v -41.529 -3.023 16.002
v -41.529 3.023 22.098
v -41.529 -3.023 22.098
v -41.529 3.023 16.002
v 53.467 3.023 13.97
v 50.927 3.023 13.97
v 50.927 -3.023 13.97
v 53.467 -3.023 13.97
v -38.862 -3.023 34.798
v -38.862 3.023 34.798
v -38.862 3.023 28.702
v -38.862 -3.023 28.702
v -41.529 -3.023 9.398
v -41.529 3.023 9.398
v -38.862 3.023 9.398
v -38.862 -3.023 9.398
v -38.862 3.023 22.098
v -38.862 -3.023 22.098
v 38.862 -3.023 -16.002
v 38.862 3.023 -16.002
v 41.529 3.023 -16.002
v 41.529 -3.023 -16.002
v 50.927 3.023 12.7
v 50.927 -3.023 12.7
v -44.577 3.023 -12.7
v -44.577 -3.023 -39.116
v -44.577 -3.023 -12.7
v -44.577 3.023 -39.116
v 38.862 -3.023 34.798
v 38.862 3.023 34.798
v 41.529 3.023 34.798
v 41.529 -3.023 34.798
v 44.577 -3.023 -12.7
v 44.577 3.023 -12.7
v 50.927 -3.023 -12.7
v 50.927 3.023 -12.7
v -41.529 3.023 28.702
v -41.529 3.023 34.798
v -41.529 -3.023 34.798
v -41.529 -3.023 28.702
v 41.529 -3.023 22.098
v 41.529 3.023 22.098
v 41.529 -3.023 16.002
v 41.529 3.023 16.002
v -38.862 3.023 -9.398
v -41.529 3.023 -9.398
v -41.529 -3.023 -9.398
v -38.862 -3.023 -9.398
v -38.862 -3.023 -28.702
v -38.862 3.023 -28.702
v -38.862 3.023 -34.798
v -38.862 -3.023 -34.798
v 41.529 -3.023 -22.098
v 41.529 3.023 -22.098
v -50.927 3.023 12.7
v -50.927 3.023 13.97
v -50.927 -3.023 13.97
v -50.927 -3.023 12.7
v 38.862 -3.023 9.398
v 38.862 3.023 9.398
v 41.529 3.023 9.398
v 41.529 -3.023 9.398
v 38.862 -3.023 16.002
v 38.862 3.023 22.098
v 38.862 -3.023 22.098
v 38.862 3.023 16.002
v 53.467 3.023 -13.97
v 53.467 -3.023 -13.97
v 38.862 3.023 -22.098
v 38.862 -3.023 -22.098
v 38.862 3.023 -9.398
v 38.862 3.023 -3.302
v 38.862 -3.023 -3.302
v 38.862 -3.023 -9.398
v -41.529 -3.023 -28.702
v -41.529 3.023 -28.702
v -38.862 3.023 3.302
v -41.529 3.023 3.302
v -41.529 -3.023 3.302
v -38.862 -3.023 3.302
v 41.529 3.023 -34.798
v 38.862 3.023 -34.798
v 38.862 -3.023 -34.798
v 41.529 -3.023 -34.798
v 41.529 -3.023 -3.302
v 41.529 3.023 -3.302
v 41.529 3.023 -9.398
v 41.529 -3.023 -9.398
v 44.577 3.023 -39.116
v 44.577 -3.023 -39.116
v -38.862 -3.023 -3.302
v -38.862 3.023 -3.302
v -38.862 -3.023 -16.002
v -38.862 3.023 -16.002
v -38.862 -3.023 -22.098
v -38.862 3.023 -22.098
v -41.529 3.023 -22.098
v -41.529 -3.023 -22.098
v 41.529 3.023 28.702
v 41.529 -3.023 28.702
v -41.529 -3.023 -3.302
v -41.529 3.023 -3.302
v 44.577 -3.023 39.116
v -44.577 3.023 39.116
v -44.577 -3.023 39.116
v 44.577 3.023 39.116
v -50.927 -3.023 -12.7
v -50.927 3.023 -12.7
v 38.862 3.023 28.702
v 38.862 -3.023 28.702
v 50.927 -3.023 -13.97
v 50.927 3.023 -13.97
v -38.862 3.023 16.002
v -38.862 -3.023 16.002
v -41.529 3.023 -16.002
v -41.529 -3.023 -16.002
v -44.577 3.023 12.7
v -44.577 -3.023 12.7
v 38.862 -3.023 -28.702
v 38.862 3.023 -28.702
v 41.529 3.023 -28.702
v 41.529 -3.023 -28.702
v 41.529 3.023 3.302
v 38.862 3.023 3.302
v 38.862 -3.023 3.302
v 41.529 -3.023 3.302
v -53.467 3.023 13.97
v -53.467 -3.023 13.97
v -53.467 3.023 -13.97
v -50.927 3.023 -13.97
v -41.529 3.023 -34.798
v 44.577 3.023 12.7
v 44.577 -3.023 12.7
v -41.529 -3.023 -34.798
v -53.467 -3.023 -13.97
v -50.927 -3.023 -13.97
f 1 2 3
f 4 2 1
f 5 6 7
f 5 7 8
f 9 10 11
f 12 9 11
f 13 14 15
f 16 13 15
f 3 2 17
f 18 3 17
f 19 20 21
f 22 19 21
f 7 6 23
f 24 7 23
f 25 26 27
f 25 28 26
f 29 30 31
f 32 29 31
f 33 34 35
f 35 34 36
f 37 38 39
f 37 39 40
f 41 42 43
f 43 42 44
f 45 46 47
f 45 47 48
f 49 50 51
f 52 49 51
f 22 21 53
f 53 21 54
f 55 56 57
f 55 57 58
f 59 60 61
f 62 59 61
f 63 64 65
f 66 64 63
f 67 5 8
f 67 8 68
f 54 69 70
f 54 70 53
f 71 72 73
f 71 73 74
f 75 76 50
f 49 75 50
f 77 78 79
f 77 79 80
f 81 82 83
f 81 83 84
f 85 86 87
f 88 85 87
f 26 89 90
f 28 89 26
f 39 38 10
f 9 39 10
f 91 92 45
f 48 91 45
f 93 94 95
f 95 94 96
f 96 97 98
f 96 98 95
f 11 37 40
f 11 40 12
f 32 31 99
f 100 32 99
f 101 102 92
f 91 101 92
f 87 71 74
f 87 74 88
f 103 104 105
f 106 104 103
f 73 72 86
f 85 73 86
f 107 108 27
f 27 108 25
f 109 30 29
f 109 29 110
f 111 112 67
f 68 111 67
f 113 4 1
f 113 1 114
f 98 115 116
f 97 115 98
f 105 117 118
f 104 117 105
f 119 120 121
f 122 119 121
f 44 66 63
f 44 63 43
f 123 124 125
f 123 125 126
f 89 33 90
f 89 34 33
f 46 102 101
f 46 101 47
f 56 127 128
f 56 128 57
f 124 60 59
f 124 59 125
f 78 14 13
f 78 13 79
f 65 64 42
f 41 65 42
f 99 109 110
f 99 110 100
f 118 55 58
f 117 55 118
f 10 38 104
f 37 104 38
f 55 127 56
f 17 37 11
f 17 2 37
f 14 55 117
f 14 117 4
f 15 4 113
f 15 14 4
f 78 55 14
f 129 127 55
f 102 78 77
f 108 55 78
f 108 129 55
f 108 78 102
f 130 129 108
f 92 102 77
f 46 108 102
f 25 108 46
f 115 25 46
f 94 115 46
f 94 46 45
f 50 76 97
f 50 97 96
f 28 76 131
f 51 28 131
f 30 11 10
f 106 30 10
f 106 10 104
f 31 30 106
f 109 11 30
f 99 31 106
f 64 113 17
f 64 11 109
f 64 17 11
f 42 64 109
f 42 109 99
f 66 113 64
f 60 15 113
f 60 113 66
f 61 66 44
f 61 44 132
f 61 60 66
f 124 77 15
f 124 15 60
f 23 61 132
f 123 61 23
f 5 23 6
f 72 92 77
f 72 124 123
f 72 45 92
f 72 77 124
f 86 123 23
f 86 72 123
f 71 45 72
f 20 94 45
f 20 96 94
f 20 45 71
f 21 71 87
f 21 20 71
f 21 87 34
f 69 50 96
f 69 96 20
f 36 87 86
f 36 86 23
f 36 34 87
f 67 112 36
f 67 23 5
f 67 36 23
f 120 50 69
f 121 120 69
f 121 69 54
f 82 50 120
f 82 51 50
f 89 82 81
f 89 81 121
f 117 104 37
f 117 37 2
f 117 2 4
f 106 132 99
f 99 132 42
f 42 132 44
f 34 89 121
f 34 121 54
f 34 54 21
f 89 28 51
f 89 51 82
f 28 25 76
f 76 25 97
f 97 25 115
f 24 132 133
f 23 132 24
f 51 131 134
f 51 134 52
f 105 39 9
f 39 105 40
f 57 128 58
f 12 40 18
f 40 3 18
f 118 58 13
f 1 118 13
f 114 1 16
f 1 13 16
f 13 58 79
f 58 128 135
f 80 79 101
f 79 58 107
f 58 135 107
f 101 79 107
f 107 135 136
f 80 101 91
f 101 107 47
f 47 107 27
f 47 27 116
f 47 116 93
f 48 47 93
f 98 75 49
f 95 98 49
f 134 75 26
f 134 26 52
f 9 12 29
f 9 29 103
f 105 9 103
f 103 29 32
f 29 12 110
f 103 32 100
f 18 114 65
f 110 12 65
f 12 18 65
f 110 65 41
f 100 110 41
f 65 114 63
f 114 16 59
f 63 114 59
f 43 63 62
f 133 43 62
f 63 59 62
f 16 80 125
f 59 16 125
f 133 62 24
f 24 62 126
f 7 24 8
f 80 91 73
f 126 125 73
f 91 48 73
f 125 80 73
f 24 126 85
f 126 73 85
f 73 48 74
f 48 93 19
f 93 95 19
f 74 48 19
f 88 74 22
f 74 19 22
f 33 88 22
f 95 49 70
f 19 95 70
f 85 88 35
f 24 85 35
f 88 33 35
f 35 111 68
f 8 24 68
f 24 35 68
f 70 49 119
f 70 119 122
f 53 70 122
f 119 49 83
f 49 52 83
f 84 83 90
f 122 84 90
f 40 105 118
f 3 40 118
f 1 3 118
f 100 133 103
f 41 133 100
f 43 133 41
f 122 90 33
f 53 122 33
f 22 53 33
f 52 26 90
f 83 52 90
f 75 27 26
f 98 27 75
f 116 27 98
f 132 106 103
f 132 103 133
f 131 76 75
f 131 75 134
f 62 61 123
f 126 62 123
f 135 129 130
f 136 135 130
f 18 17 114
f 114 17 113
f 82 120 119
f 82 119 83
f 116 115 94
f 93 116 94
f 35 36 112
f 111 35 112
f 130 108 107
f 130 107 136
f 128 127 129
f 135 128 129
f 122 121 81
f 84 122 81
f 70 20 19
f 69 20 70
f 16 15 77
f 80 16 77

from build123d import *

# Parameters (mm, degrees)
SKETCH1_W           = 6.35
SKETCH1_H           = 25.4
BOSS_EXTRUDE1_DEPTH = 3.0226
SKETCH4_W           = 2.667
SKETCH4_H           = 6.096
CUT_EXTRUDE2_DEPTH  = 6.0452
SKETCH5_W           = 2.54
SKETCH5_H           = 27.94
BOSS_EXTRUDE2_DEPTH = 6.0452


with BuildPart() as part:
    # Sketch1 → Boss-Extrude1 (new, symmetric)
    with BuildSketch(Plane(origin=(0, 0, 0), x_dir=(1, 0, 0), z_dir=(0, 1, 0))):
        Polygon((0, -39.116), (0, 39.116), (-44.577, 39.116), (-44.577, 12.7), (-44.577, -12.7), (-44.577, -39.116), align=None)
        with Locations((-47.752, 0)):
            Rectangle(SKETCH1_W, SKETCH1_H)
        Polygon((44.577, 39.116), (0, 39.116), (0, -39.116), (44.577, -39.116), (44.577, -12.7), (44.577, 12.7), align=None)
        with Locations((47.752, 0)):
            Rectangle(SKETCH1_W, SKETCH1_H)
    extrude(amount=BOSS_EXTRUDE1_DEPTH, both=True)

    # Sketch4 → Cut-Extrude2 (cut)
    with BuildSketch(Plane(origin=(0, 3.0226, 0), x_dir=(1, 0, 0), z_dir=(0, 1, 0))):
        with Locations((-40.1955, -31.75)):
            Rectangle(SKETCH4_W, SKETCH4_H)
        with Locations((-40.1955, -19.05)):
            Rectangle(SKETCH4_W, SKETCH4_H)
        with Locations((-40.1955, -6.35)):
            Rectangle(SKETCH4_W, SKETCH4_H)
        with Locations((-40.1955, 6.35)):
            Rectangle(SKETCH4_W, SKETCH4_H)
        with Locations((-40.1955, 19.05)):
            Rectangle(SKETCH4_W, SKETCH4_H)
        with Locations((-40.1955, 31.75)):
            Rectangle(SKETCH4_W, SKETCH4_H)
        with Locations((40.1955, -19.05)):
            Rectangle(SKETCH4_W, SKETCH4_H)
        with Locations((40.1955, -6.35)):
            Rectangle(SKETCH4_W, SKETCH4_H)
        with Locations((40.1955, 6.35)):
            Rectangle(SKETCH4_W, SKETCH4_H)
        with Locations((40.1955, 19.05)):
            Rectangle(SKETCH4_W, SKETCH4_H)
        with Locations((40.1955, 31.75)):
            Rectangle(SKETCH4_W, SKETCH4_H)
        with Locations((40.1955, -31.75)):
            Rectangle(SKETCH4_W, SKETCH4_H)
    extrude(amount=-CUT_EXTRUDE2_DEPTH, mode=Mode.SUBTRACT)

    # Sketch5 → Boss-Extrude2 (add)
    with BuildSketch(Plane(origin=(0, 3.0226, 0), x_dir=(1, 0, 0), z_dir=(0, 1, 0))):
        with Locations((-52.197, 0)):
            Rectangle(SKETCH5_W, SKETCH5_H)
        with Locations((52.197, 0)):
            Rectangle(SKETCH5_W, SKETCH5_H)
    extrude(amount=-BOSS_EXTRUDE2_DEPTH)


solid = part.part
